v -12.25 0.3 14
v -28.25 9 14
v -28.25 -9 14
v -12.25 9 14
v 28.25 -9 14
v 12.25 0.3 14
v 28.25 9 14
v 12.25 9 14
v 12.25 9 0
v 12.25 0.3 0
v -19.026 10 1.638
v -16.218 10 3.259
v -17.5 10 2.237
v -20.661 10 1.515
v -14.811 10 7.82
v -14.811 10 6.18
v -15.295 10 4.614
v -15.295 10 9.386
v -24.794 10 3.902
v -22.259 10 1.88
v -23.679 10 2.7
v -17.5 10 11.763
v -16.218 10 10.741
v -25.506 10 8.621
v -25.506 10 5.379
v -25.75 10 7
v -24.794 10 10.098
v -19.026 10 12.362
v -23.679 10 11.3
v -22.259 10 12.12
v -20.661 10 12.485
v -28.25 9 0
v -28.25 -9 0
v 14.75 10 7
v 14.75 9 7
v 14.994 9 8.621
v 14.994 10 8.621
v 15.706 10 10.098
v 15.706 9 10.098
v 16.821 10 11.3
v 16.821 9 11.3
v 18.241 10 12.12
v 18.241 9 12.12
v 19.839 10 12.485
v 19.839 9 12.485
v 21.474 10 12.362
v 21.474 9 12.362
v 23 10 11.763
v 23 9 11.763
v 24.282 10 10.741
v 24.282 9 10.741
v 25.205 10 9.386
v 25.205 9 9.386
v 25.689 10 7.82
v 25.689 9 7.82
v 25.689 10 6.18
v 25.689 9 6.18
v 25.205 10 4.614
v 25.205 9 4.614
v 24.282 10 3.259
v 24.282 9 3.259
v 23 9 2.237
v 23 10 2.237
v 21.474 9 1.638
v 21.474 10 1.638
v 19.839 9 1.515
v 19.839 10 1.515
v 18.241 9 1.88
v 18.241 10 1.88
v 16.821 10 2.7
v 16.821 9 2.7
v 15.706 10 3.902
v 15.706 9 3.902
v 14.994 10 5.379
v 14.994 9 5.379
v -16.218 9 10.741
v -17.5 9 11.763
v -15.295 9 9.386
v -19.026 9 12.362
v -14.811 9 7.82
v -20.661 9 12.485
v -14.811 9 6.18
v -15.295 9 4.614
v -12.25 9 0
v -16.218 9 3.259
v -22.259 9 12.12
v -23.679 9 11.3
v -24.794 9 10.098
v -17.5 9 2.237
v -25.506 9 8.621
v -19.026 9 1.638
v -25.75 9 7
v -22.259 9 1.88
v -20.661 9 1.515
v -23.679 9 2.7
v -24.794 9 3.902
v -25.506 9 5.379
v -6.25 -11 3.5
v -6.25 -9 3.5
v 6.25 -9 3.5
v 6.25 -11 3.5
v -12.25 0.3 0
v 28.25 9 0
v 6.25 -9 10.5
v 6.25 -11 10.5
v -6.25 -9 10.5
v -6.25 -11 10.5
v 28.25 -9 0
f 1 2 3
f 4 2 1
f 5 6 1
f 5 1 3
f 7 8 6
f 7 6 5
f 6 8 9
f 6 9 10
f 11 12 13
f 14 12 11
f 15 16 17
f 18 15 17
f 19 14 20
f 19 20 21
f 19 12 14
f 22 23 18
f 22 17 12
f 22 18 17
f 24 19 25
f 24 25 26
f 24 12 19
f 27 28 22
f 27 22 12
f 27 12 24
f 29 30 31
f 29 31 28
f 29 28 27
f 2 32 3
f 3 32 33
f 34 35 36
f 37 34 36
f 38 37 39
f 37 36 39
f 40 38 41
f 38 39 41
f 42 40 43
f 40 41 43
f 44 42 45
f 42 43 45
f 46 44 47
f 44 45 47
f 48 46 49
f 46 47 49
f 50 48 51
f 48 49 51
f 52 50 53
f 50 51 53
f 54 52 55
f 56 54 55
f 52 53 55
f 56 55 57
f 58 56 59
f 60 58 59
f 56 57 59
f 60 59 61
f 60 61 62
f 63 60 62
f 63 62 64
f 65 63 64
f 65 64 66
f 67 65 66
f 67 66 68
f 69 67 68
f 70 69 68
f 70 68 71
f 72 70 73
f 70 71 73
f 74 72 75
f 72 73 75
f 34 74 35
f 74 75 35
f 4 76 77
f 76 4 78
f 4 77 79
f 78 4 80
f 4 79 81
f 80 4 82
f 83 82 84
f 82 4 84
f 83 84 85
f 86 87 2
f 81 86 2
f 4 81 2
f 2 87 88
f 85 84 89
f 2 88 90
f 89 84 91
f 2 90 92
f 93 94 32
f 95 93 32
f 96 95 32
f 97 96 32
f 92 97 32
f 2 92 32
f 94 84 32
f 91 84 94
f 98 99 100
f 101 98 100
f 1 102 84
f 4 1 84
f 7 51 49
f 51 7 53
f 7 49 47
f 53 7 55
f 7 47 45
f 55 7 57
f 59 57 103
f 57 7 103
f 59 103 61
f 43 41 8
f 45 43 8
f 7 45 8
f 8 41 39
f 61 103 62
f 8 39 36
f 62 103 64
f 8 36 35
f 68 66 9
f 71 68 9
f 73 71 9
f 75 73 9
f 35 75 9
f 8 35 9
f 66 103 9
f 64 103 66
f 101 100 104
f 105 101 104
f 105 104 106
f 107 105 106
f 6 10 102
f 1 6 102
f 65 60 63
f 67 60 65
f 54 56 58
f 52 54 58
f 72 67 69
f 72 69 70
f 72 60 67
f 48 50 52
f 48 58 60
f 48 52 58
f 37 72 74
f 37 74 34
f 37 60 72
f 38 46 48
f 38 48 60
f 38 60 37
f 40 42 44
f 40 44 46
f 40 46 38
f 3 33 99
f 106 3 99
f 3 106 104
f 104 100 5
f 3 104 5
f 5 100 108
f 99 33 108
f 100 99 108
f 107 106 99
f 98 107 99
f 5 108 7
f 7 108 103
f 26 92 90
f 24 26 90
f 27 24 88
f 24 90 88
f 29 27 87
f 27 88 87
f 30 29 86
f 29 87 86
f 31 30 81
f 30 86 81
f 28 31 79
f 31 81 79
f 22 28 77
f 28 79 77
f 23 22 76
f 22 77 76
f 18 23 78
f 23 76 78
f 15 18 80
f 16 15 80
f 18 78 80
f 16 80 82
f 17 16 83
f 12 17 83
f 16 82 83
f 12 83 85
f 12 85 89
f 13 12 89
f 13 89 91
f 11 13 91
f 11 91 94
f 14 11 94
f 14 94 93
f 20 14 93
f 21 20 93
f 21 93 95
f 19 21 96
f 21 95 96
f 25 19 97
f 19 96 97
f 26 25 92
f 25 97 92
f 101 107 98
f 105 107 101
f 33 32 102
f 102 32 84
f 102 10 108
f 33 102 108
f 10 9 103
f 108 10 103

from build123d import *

# Parameters (mm, degrees)
F1_DEPTH = 14
F2_R     = 5.5
F3_DEPTH = 1
F5_DEPTH = 2


with BuildPart() as f1:
    # F0 (on Top) → F1 (new body)
    with BuildSketch(Plane.XY):
        Polygon((-12.25, 0.3), (-12.25, 9), (-28.25, 9), (-28.25, -9), (12.25, -9), (12.25, 0.3), align=None)
        Polygon((28.25, -9), (28.25, 9), (12.25, 9), (12.25, 0.3), (12.25, -9), align=None)
    extrude(amount=F1_DEPTH)

    # F2 (on face) → F3 (join)
    with BuildSketch(Plane(origin=(0, 9, 0), x_dir=(-1, 0, 0), z_dir=(0, 1, 0))):
        with Locations((-20.25, 7)):
            Circle(F2_R)
        with Locations((20.25, 7)):
            Circle(F2_R)
    extrude(amount=F3_DEPTH)

    # F4 (on face) → F5 (join)
    with BuildSketch(Plane.XZ.offset(9)):
        Polygon((-6.25, 3.5), (0, 3.5), (6.25, 3.5), (6.25, 10.5), (0, 10.5), (-6.25, 10.5), align=None)
    extrude(amount=F5_DEPTH)


solid = f1.part
